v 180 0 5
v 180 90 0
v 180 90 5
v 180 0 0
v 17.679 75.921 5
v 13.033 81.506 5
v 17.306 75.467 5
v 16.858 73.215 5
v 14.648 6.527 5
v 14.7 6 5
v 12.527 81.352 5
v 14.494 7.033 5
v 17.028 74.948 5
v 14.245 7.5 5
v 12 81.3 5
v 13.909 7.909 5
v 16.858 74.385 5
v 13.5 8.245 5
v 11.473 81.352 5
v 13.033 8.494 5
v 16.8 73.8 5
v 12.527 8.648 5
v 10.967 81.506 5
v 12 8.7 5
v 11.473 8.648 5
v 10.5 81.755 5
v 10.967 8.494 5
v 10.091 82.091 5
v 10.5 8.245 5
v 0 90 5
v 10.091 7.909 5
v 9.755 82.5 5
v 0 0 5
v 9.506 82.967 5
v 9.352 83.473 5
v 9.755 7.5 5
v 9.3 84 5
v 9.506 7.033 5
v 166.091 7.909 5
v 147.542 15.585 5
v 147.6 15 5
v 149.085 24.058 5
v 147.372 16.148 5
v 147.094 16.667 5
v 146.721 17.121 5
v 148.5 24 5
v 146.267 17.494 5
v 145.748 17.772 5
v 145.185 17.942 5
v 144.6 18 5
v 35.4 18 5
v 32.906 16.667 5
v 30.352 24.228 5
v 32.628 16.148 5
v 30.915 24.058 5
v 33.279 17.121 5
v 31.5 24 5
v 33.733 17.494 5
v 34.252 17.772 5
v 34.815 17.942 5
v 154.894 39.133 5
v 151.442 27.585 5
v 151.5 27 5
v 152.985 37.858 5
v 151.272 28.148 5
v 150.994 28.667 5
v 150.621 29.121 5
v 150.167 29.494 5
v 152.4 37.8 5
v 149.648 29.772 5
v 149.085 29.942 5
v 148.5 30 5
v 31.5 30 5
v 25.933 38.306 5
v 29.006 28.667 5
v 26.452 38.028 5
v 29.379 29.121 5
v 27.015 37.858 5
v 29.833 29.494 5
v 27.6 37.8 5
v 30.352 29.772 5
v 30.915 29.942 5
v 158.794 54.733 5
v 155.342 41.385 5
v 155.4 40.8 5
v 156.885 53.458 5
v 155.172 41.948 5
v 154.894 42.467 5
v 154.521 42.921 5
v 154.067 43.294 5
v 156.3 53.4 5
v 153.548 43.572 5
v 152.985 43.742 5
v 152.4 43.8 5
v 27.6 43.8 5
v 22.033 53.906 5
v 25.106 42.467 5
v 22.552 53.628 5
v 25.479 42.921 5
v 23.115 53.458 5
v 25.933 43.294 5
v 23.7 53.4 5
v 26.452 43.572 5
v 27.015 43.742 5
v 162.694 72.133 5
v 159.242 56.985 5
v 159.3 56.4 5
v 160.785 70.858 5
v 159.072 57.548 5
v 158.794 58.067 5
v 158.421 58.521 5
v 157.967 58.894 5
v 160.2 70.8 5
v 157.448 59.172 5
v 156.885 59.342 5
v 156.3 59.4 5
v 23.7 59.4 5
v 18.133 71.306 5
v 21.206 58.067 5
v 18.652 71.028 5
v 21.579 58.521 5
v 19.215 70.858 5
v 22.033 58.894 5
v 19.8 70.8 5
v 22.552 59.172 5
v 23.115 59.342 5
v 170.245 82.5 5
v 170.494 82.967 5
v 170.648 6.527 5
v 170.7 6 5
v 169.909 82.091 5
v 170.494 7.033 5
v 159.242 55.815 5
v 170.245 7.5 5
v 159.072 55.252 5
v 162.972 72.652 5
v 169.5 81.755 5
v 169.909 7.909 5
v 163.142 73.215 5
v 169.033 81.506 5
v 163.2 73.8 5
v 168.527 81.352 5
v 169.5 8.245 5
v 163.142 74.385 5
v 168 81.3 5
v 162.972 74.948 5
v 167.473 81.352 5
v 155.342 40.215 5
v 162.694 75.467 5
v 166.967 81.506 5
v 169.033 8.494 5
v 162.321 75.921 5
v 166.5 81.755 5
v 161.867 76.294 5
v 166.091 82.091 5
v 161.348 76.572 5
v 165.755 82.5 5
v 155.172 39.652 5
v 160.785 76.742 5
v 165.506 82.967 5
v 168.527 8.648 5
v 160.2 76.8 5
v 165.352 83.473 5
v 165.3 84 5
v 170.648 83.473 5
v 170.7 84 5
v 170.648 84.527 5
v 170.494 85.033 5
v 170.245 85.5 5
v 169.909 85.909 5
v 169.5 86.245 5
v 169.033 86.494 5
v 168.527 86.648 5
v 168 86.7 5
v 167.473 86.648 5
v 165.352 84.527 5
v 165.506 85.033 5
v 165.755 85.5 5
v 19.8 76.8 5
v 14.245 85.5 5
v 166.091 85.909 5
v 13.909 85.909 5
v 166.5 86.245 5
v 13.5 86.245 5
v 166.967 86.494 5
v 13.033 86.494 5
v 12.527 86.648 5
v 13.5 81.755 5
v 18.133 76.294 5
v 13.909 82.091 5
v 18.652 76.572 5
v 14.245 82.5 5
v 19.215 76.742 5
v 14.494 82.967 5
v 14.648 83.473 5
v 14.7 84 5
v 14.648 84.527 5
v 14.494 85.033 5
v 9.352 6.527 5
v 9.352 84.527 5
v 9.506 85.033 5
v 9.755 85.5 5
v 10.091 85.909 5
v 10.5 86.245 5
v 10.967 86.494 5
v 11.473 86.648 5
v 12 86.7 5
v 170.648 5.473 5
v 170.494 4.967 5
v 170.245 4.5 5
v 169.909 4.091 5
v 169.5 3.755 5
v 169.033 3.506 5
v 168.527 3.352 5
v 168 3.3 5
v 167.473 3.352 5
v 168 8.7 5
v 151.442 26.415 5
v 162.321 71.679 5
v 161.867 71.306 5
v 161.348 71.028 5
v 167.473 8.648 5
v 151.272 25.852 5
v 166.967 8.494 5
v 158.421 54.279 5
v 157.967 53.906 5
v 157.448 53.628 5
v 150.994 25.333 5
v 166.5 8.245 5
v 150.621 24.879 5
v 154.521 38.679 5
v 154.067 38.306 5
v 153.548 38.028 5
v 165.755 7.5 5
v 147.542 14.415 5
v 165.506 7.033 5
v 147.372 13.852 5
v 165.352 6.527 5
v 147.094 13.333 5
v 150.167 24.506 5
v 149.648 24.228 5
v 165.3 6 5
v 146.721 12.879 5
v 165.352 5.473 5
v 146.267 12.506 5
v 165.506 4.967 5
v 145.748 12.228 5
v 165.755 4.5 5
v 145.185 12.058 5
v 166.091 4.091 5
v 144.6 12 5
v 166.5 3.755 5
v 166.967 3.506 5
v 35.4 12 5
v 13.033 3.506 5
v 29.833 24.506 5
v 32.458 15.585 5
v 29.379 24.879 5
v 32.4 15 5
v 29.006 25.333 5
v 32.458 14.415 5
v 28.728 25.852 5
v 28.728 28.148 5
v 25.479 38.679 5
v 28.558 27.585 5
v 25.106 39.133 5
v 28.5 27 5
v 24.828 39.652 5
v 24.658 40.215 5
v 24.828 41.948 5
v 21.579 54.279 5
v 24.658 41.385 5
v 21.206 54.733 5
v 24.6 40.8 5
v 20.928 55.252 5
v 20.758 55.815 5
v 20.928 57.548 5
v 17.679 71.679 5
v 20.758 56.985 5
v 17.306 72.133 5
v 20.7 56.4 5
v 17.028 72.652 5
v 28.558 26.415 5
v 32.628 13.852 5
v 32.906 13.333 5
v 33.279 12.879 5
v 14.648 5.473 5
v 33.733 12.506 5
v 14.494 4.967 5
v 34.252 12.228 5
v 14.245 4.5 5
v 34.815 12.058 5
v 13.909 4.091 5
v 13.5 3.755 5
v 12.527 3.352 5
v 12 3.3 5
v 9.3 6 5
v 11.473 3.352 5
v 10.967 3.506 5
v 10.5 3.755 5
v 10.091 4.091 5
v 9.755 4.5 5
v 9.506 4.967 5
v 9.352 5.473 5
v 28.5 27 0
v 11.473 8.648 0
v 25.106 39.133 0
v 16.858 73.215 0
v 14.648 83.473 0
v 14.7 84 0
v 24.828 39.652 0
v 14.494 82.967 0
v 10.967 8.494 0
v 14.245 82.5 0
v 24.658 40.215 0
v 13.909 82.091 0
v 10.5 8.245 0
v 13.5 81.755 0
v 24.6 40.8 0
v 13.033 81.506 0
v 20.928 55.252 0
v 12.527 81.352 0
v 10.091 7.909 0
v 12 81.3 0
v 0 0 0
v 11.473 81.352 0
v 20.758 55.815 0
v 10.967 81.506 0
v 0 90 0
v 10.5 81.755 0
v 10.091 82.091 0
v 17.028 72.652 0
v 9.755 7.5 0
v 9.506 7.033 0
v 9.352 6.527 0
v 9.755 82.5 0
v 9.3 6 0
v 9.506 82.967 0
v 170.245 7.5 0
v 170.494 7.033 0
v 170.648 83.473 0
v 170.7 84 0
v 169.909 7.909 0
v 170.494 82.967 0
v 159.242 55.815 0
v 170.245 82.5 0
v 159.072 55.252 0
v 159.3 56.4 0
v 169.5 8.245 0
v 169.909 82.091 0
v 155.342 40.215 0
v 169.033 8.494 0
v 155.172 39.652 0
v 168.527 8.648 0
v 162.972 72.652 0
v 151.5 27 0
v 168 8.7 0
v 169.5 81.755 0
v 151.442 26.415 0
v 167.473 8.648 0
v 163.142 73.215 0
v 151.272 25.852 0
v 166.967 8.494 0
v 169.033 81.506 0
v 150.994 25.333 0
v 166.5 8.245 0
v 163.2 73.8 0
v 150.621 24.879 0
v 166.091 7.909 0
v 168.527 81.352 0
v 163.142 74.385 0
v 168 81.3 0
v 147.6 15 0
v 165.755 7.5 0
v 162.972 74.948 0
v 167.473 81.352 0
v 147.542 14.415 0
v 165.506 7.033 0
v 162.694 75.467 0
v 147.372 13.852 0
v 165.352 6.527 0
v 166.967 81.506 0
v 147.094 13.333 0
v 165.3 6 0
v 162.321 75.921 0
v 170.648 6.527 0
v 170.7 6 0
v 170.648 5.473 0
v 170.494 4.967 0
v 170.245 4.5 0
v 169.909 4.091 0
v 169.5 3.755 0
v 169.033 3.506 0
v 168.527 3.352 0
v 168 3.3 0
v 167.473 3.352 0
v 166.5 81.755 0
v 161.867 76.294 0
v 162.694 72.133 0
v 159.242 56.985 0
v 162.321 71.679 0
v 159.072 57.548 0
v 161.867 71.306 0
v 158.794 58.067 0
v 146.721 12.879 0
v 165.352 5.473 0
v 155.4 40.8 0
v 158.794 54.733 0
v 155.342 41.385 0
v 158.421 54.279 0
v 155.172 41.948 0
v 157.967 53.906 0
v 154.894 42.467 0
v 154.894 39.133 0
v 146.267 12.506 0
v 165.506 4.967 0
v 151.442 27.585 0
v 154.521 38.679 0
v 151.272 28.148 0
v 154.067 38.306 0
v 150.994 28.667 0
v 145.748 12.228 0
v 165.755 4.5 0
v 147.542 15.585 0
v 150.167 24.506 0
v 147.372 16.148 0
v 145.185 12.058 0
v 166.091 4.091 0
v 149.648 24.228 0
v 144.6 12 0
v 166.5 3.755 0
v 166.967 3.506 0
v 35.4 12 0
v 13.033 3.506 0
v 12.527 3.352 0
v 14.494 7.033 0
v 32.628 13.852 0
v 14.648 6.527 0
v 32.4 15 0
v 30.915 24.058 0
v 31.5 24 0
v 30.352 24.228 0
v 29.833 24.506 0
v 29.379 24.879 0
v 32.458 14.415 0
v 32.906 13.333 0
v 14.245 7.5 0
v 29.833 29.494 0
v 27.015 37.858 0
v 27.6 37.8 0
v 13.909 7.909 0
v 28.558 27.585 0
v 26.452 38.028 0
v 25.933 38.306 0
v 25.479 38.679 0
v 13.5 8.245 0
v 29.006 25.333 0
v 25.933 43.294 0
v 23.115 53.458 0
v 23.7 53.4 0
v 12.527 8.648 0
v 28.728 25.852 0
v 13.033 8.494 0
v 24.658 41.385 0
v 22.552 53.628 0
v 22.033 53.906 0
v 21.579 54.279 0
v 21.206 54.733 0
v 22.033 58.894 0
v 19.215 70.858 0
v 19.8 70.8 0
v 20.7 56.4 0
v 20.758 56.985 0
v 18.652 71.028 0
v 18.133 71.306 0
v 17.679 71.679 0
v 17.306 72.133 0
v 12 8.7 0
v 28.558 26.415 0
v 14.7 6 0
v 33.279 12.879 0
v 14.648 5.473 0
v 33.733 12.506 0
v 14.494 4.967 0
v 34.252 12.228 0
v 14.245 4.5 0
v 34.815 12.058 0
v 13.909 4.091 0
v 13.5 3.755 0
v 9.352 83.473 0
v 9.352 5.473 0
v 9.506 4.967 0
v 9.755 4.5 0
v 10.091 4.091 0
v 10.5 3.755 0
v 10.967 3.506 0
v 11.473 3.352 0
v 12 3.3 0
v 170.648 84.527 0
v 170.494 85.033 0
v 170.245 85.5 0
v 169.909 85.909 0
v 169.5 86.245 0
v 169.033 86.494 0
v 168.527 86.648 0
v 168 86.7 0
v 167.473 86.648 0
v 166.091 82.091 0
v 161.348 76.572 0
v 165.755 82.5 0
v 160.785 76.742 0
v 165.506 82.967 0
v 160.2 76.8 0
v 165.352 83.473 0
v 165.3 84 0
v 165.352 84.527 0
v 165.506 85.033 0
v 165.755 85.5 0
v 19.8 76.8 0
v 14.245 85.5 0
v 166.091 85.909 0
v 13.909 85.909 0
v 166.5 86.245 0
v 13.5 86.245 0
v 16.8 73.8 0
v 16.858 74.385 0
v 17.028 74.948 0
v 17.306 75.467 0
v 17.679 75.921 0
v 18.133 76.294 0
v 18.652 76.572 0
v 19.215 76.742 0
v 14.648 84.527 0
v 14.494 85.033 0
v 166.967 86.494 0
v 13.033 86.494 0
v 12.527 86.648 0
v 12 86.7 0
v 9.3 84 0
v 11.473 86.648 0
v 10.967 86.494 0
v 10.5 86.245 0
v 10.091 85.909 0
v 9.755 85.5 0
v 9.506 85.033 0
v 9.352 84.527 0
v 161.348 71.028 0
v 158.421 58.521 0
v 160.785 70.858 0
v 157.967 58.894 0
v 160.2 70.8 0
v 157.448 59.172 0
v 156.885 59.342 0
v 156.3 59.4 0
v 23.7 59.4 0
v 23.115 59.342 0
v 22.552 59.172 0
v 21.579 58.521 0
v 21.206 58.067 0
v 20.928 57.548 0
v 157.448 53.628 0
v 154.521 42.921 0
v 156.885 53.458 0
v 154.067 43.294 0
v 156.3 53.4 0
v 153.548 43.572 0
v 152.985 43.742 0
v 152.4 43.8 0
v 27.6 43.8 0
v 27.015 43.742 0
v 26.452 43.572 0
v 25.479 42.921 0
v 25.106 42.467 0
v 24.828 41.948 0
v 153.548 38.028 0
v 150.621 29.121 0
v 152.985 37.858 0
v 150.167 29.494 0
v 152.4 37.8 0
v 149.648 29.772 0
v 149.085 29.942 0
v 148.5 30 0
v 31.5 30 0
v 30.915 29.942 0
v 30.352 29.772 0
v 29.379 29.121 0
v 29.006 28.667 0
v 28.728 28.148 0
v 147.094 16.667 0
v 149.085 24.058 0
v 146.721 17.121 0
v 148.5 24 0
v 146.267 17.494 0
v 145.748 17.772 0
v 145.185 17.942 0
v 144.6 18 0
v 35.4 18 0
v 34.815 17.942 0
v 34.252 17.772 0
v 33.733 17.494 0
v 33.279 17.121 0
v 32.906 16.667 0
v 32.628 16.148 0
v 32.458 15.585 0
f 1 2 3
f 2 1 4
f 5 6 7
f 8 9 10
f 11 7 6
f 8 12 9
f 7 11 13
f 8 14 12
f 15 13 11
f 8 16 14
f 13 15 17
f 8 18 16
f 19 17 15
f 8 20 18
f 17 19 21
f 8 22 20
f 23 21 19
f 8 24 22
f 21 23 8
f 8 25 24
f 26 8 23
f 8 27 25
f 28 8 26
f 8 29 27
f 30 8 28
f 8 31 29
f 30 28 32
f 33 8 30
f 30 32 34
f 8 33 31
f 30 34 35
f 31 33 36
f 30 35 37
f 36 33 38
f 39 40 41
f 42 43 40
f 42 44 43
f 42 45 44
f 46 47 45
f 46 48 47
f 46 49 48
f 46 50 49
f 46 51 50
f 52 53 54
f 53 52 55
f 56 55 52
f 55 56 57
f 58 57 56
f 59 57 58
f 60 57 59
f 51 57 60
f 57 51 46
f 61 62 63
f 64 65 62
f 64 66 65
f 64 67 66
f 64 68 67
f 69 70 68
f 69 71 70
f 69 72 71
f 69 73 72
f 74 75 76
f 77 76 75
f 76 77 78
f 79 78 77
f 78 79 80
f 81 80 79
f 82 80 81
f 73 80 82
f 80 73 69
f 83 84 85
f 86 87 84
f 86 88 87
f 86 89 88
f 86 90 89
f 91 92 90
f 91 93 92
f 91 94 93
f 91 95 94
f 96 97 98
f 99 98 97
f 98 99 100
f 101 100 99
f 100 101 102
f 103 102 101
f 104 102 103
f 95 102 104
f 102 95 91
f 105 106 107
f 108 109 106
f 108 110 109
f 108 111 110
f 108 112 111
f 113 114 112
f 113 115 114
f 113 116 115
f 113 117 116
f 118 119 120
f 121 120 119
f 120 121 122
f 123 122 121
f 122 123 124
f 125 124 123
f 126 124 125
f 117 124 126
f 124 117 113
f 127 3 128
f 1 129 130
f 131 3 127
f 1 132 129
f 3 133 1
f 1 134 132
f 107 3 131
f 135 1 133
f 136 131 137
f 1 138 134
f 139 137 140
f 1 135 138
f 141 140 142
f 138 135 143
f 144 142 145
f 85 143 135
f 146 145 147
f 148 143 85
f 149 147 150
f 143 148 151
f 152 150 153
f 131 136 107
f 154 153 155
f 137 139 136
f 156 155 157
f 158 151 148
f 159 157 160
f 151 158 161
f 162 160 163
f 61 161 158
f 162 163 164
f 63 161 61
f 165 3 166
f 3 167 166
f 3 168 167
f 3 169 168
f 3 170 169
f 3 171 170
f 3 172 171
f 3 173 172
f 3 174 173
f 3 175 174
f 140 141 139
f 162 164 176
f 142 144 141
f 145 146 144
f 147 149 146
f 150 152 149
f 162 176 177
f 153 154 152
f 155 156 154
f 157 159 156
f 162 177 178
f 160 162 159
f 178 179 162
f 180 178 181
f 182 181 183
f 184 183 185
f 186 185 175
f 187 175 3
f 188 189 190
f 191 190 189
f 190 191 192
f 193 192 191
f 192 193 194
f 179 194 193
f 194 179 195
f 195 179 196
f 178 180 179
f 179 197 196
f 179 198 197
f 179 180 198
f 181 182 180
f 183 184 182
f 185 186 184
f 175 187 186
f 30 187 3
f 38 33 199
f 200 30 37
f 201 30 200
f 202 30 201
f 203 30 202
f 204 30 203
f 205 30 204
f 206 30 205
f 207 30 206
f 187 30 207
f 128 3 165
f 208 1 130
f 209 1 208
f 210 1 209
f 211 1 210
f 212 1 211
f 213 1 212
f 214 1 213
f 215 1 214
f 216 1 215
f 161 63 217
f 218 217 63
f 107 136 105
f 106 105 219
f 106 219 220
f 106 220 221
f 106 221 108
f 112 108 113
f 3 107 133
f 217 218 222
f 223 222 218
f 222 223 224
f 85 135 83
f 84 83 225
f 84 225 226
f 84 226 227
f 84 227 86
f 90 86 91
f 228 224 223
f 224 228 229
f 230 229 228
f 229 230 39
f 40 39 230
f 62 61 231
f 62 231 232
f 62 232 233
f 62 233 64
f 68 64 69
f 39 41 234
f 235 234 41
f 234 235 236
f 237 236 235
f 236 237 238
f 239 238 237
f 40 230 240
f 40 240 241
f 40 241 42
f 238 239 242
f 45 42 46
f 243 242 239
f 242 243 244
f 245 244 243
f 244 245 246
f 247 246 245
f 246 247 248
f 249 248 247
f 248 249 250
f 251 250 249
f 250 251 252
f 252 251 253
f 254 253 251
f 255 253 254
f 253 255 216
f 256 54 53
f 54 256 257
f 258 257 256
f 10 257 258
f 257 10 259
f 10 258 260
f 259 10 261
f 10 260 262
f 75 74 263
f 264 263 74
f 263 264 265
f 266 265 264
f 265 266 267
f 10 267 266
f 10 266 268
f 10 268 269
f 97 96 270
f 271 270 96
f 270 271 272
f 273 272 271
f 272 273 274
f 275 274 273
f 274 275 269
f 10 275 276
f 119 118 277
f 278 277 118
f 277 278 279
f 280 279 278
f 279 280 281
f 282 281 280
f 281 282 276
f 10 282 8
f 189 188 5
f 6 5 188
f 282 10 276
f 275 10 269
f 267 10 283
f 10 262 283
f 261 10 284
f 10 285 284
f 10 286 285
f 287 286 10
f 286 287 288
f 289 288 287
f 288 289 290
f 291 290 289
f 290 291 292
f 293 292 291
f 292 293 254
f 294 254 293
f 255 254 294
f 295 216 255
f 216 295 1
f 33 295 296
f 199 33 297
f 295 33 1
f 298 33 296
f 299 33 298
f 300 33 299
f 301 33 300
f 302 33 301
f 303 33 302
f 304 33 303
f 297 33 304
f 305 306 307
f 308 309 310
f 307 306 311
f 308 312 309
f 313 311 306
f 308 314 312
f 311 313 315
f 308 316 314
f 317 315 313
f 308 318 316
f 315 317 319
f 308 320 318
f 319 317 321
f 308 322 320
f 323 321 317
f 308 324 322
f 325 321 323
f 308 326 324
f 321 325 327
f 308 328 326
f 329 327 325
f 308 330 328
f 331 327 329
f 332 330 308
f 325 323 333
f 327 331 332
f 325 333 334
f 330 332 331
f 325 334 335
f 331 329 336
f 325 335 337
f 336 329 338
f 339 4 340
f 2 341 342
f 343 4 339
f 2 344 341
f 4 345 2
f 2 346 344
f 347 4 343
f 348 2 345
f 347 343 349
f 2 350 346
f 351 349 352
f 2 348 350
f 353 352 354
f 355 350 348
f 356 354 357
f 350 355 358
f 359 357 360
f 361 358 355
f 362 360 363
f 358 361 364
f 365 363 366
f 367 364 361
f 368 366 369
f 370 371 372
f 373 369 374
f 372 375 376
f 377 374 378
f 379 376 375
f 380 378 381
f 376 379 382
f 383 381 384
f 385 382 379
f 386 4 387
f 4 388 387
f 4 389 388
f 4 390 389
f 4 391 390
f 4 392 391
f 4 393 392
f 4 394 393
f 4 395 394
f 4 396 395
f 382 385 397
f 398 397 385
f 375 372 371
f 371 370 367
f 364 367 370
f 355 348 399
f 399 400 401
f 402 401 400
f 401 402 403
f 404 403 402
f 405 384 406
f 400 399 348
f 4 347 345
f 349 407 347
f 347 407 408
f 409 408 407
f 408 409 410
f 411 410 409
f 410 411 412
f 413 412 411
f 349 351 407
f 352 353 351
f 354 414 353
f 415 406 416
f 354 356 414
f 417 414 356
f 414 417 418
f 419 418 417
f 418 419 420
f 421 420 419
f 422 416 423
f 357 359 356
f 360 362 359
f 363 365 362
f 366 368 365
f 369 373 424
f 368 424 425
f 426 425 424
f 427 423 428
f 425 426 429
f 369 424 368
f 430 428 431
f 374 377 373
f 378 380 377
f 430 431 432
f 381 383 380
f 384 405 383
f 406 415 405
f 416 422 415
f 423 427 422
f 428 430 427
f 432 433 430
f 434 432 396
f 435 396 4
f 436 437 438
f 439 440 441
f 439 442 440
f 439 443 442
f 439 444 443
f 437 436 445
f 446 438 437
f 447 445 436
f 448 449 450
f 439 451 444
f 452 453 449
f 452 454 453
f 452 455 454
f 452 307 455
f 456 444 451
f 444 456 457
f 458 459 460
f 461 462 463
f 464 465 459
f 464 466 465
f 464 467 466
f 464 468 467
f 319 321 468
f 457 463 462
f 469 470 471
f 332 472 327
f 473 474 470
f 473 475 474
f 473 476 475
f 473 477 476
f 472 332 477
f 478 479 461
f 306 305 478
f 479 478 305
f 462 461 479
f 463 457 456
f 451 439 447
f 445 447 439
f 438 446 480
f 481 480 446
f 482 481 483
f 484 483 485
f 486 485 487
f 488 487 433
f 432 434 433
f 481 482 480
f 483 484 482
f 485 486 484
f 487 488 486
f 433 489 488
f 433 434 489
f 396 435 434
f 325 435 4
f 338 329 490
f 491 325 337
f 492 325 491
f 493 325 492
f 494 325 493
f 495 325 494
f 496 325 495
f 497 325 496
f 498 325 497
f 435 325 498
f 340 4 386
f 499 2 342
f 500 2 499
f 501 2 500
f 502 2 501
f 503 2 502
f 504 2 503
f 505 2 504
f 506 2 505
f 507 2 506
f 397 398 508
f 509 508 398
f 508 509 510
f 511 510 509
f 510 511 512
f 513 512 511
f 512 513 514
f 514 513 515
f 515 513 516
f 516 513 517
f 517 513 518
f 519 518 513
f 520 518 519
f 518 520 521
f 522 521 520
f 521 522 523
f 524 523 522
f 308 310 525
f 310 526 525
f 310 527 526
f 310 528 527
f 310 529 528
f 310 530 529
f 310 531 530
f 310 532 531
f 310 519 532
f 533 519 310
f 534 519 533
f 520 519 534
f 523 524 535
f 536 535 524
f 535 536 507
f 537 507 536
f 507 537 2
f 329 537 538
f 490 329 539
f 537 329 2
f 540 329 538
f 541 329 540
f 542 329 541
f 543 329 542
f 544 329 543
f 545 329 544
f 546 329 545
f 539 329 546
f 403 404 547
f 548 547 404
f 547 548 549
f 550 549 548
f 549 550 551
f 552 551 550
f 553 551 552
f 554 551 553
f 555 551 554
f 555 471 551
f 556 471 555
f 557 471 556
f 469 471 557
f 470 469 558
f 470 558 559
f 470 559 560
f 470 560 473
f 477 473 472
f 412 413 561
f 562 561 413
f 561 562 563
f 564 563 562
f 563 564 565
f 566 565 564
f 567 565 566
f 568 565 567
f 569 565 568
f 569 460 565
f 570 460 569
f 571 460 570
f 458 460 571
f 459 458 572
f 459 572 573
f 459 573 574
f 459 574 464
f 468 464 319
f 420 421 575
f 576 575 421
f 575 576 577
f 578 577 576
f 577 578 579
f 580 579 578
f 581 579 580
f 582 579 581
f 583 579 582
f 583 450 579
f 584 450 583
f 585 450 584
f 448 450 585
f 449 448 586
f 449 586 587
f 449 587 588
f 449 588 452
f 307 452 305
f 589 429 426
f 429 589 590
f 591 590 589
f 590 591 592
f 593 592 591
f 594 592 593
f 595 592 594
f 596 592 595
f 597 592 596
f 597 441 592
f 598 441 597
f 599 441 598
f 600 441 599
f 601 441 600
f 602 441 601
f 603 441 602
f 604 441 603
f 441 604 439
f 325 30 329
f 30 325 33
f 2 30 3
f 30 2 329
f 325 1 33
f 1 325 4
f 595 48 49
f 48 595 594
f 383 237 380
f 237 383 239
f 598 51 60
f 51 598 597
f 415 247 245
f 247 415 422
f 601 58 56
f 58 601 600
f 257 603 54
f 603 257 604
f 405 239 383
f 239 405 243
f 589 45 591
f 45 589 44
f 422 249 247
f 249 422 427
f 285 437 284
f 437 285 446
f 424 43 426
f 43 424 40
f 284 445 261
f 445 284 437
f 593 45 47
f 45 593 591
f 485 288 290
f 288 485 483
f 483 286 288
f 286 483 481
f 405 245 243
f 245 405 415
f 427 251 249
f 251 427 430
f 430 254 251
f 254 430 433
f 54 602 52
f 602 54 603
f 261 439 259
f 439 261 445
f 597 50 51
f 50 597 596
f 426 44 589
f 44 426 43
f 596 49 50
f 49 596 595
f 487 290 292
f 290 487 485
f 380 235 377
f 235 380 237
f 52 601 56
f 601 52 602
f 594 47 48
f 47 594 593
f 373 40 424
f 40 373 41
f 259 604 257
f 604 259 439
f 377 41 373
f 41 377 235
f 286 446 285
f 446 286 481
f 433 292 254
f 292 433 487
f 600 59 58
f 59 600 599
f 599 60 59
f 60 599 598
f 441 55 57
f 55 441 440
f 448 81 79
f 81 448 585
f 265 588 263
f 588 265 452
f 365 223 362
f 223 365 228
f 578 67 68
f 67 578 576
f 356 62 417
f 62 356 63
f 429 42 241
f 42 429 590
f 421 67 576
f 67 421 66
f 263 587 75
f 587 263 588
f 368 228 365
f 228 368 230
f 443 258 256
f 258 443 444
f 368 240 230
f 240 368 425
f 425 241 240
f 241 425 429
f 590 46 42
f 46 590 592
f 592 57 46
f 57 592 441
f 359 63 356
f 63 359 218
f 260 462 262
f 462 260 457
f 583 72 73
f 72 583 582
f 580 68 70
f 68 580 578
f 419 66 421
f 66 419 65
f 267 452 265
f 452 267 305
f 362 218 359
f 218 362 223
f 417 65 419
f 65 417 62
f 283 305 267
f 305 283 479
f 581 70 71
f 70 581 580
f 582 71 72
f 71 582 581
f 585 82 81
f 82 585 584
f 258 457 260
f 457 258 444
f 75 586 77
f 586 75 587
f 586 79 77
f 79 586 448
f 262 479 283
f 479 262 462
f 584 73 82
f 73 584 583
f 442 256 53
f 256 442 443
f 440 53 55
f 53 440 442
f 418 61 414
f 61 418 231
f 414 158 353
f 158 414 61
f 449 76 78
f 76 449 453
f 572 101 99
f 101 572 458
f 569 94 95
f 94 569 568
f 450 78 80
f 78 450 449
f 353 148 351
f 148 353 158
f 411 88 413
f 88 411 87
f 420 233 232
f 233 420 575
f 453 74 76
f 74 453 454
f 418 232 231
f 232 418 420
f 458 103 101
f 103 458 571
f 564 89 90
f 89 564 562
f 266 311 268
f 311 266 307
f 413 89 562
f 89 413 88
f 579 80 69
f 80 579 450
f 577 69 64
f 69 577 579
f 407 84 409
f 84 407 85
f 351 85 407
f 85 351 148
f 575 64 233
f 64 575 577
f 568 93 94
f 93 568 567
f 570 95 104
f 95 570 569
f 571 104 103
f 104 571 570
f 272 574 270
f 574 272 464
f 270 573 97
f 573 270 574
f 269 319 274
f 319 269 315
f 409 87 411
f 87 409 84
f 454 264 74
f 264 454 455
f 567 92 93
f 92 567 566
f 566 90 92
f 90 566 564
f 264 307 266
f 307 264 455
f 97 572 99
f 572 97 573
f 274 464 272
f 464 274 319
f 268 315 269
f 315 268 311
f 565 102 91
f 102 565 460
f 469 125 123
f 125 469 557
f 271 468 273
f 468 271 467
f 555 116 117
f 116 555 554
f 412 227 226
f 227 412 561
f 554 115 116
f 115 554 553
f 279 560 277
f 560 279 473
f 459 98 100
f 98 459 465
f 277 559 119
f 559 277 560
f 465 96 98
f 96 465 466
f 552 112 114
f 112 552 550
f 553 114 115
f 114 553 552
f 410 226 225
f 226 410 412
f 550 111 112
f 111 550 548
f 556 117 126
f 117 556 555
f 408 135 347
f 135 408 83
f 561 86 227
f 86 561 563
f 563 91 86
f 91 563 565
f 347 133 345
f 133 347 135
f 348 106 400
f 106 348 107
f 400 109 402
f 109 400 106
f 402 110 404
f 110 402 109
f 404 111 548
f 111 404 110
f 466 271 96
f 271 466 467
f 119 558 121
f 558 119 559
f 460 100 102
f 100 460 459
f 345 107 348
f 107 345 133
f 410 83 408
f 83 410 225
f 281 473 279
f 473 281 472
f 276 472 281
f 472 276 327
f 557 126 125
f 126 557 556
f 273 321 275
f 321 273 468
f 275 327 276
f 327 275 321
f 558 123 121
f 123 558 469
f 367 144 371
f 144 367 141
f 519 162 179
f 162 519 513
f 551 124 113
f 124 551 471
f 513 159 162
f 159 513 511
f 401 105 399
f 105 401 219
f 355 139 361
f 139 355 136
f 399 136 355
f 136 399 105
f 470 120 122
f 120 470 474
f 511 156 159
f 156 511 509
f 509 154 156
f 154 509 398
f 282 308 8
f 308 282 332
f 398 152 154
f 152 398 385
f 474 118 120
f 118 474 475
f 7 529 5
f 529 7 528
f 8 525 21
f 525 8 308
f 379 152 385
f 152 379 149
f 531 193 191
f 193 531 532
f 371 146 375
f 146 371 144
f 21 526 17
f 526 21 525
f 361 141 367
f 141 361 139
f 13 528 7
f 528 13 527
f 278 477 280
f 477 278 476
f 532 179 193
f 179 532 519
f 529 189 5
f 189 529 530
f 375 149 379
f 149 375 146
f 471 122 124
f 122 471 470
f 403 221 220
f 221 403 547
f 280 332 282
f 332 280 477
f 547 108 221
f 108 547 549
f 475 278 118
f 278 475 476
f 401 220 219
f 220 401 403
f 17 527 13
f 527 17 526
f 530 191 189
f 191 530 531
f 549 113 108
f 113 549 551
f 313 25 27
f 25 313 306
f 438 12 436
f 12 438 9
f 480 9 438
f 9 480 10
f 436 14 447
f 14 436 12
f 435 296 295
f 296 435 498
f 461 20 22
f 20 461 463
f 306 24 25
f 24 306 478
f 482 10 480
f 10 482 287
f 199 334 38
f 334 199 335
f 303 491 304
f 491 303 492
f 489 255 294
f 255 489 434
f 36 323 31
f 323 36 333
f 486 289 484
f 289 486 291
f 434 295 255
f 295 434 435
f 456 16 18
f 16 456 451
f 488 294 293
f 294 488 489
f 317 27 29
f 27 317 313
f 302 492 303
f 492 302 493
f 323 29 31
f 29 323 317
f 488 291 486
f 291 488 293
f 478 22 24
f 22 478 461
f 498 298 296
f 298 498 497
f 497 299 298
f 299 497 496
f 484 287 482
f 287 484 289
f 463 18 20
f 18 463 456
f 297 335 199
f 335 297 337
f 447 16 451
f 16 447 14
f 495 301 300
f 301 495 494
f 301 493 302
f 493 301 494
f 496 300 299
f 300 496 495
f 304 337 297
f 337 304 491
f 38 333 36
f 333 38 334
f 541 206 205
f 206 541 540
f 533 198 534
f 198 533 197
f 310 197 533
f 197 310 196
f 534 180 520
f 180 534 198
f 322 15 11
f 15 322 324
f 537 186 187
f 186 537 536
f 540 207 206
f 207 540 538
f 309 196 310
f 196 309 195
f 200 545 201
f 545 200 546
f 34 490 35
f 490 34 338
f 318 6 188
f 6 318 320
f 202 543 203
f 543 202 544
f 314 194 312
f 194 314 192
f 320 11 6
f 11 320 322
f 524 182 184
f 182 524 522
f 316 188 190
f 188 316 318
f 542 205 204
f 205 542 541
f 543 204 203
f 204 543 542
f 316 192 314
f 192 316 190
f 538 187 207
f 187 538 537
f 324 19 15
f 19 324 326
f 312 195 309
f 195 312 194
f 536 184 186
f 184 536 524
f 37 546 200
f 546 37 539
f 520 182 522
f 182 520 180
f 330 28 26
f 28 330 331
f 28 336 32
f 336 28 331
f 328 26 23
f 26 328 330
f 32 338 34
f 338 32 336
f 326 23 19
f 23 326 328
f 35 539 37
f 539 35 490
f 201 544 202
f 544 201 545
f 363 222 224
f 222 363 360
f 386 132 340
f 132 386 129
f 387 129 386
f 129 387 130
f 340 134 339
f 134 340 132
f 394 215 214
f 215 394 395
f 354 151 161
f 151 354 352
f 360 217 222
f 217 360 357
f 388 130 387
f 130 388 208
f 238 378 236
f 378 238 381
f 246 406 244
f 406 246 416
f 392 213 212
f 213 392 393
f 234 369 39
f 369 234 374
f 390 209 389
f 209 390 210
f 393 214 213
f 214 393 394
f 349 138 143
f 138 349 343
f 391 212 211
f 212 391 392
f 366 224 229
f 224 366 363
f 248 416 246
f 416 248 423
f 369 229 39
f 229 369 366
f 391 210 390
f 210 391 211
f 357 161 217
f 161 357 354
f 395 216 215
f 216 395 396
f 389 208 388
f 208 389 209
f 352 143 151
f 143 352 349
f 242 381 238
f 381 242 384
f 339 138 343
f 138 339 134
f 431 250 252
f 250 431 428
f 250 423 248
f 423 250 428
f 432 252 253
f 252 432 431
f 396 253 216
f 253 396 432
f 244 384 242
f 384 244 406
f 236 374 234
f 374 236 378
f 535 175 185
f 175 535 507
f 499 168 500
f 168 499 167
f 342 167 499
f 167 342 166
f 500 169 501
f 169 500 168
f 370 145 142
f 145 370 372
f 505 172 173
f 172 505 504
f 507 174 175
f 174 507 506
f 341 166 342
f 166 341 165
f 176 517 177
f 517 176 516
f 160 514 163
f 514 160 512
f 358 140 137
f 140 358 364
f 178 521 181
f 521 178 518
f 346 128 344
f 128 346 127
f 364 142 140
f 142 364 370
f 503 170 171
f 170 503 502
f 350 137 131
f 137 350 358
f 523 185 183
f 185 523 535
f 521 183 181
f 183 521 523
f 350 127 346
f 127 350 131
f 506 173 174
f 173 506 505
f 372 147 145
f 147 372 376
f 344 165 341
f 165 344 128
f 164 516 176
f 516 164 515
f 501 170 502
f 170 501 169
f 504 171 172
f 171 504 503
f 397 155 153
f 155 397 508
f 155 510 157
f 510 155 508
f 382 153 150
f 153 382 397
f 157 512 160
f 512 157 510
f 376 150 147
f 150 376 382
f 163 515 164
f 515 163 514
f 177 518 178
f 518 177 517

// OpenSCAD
$fn = 32;

// ----------------------------------------------------------------------
// Slotted panel: 180 x 90 mm, 5 рядов of slots
// ----------------------------------------------------------------------

// --- parameters (mm) ---
panel_w = 180;            // panel width
panel_d = 90;             // panel depth
thick = 5;                // panel thickness
slot_w = 6;               // slot width
pitch0 = 12;              // first row pitch
pitch_step = 1.8;         // pitch increase per row
margin = 12;              // margin around the slot field
rows = 5;                 // number of slot rows
mount_d = 5.4;            // mounting holes
mount_x = 78;             // mounting hole offset

difference() {
  union() {
    cube([panel_w, panel_d, thick]);
  }
  /* slot rows: stadium shaped cutters, 2.5 mm clear of both faces */
  /* row 0: pitch 12, length 109.2 */
  hull() {
    translate([35.4, 15, -2.5]) cylinder(h = thick + 5, d = slot_w);
    translate([144.6, 15, -2.5]) cylinder(h = thick + 5, d = slot_w);
  }
  /* row 1: pitch 13.8, length 117 */
  hull() {
    translate([31.5, 27, -2.5]) cylinder(h = thick + 5, d = slot_w);
    translate([148.5, 27, -2.5]) cylinder(h = thick + 5, d = slot_w);
  }
  /* row 2: pitch 15.6, length 124.8 */
  hull() {
    translate([27.6, 40.8, -2.5]) cylinder(h = thick + 5, d = slot_w);
    translate([152.4, 40.8, -2.5]) cylinder(h = thick + 5, d = slot_w);
  }
  /* row 3: pitch 17.4, length 132.6 */
  hull() {
    translate([23.7, 56.4, -2.5]) cylinder(h = thick + 5, d = slot_w);
    translate([156.3, 56.4, -2.5]) cylinder(h = thick + 5, d = slot_w);
  }
  /* row 4: pitch 19.2, length 140.4 */
  hull() {
    translate([19.8, 73.8, -2.5]) cylinder(h = thick + 5, d = slot_w);
    translate([160.2, 73.8, -2.5]) cylinder(h = thick + 5, d = slot_w);
  }
  translate([12, 6, -2.5]) cylinder(h = 10, d = mount_d);
  translate([12, 84, -2.5]) cylinder(h = 10, d = mount_d);
  translate([168, 6, -2.5]) cylinder(h = 10, d = mount_d);
  translate([168, 84, -2.5]) cylinder(h = 10, d = mount_d);
}
